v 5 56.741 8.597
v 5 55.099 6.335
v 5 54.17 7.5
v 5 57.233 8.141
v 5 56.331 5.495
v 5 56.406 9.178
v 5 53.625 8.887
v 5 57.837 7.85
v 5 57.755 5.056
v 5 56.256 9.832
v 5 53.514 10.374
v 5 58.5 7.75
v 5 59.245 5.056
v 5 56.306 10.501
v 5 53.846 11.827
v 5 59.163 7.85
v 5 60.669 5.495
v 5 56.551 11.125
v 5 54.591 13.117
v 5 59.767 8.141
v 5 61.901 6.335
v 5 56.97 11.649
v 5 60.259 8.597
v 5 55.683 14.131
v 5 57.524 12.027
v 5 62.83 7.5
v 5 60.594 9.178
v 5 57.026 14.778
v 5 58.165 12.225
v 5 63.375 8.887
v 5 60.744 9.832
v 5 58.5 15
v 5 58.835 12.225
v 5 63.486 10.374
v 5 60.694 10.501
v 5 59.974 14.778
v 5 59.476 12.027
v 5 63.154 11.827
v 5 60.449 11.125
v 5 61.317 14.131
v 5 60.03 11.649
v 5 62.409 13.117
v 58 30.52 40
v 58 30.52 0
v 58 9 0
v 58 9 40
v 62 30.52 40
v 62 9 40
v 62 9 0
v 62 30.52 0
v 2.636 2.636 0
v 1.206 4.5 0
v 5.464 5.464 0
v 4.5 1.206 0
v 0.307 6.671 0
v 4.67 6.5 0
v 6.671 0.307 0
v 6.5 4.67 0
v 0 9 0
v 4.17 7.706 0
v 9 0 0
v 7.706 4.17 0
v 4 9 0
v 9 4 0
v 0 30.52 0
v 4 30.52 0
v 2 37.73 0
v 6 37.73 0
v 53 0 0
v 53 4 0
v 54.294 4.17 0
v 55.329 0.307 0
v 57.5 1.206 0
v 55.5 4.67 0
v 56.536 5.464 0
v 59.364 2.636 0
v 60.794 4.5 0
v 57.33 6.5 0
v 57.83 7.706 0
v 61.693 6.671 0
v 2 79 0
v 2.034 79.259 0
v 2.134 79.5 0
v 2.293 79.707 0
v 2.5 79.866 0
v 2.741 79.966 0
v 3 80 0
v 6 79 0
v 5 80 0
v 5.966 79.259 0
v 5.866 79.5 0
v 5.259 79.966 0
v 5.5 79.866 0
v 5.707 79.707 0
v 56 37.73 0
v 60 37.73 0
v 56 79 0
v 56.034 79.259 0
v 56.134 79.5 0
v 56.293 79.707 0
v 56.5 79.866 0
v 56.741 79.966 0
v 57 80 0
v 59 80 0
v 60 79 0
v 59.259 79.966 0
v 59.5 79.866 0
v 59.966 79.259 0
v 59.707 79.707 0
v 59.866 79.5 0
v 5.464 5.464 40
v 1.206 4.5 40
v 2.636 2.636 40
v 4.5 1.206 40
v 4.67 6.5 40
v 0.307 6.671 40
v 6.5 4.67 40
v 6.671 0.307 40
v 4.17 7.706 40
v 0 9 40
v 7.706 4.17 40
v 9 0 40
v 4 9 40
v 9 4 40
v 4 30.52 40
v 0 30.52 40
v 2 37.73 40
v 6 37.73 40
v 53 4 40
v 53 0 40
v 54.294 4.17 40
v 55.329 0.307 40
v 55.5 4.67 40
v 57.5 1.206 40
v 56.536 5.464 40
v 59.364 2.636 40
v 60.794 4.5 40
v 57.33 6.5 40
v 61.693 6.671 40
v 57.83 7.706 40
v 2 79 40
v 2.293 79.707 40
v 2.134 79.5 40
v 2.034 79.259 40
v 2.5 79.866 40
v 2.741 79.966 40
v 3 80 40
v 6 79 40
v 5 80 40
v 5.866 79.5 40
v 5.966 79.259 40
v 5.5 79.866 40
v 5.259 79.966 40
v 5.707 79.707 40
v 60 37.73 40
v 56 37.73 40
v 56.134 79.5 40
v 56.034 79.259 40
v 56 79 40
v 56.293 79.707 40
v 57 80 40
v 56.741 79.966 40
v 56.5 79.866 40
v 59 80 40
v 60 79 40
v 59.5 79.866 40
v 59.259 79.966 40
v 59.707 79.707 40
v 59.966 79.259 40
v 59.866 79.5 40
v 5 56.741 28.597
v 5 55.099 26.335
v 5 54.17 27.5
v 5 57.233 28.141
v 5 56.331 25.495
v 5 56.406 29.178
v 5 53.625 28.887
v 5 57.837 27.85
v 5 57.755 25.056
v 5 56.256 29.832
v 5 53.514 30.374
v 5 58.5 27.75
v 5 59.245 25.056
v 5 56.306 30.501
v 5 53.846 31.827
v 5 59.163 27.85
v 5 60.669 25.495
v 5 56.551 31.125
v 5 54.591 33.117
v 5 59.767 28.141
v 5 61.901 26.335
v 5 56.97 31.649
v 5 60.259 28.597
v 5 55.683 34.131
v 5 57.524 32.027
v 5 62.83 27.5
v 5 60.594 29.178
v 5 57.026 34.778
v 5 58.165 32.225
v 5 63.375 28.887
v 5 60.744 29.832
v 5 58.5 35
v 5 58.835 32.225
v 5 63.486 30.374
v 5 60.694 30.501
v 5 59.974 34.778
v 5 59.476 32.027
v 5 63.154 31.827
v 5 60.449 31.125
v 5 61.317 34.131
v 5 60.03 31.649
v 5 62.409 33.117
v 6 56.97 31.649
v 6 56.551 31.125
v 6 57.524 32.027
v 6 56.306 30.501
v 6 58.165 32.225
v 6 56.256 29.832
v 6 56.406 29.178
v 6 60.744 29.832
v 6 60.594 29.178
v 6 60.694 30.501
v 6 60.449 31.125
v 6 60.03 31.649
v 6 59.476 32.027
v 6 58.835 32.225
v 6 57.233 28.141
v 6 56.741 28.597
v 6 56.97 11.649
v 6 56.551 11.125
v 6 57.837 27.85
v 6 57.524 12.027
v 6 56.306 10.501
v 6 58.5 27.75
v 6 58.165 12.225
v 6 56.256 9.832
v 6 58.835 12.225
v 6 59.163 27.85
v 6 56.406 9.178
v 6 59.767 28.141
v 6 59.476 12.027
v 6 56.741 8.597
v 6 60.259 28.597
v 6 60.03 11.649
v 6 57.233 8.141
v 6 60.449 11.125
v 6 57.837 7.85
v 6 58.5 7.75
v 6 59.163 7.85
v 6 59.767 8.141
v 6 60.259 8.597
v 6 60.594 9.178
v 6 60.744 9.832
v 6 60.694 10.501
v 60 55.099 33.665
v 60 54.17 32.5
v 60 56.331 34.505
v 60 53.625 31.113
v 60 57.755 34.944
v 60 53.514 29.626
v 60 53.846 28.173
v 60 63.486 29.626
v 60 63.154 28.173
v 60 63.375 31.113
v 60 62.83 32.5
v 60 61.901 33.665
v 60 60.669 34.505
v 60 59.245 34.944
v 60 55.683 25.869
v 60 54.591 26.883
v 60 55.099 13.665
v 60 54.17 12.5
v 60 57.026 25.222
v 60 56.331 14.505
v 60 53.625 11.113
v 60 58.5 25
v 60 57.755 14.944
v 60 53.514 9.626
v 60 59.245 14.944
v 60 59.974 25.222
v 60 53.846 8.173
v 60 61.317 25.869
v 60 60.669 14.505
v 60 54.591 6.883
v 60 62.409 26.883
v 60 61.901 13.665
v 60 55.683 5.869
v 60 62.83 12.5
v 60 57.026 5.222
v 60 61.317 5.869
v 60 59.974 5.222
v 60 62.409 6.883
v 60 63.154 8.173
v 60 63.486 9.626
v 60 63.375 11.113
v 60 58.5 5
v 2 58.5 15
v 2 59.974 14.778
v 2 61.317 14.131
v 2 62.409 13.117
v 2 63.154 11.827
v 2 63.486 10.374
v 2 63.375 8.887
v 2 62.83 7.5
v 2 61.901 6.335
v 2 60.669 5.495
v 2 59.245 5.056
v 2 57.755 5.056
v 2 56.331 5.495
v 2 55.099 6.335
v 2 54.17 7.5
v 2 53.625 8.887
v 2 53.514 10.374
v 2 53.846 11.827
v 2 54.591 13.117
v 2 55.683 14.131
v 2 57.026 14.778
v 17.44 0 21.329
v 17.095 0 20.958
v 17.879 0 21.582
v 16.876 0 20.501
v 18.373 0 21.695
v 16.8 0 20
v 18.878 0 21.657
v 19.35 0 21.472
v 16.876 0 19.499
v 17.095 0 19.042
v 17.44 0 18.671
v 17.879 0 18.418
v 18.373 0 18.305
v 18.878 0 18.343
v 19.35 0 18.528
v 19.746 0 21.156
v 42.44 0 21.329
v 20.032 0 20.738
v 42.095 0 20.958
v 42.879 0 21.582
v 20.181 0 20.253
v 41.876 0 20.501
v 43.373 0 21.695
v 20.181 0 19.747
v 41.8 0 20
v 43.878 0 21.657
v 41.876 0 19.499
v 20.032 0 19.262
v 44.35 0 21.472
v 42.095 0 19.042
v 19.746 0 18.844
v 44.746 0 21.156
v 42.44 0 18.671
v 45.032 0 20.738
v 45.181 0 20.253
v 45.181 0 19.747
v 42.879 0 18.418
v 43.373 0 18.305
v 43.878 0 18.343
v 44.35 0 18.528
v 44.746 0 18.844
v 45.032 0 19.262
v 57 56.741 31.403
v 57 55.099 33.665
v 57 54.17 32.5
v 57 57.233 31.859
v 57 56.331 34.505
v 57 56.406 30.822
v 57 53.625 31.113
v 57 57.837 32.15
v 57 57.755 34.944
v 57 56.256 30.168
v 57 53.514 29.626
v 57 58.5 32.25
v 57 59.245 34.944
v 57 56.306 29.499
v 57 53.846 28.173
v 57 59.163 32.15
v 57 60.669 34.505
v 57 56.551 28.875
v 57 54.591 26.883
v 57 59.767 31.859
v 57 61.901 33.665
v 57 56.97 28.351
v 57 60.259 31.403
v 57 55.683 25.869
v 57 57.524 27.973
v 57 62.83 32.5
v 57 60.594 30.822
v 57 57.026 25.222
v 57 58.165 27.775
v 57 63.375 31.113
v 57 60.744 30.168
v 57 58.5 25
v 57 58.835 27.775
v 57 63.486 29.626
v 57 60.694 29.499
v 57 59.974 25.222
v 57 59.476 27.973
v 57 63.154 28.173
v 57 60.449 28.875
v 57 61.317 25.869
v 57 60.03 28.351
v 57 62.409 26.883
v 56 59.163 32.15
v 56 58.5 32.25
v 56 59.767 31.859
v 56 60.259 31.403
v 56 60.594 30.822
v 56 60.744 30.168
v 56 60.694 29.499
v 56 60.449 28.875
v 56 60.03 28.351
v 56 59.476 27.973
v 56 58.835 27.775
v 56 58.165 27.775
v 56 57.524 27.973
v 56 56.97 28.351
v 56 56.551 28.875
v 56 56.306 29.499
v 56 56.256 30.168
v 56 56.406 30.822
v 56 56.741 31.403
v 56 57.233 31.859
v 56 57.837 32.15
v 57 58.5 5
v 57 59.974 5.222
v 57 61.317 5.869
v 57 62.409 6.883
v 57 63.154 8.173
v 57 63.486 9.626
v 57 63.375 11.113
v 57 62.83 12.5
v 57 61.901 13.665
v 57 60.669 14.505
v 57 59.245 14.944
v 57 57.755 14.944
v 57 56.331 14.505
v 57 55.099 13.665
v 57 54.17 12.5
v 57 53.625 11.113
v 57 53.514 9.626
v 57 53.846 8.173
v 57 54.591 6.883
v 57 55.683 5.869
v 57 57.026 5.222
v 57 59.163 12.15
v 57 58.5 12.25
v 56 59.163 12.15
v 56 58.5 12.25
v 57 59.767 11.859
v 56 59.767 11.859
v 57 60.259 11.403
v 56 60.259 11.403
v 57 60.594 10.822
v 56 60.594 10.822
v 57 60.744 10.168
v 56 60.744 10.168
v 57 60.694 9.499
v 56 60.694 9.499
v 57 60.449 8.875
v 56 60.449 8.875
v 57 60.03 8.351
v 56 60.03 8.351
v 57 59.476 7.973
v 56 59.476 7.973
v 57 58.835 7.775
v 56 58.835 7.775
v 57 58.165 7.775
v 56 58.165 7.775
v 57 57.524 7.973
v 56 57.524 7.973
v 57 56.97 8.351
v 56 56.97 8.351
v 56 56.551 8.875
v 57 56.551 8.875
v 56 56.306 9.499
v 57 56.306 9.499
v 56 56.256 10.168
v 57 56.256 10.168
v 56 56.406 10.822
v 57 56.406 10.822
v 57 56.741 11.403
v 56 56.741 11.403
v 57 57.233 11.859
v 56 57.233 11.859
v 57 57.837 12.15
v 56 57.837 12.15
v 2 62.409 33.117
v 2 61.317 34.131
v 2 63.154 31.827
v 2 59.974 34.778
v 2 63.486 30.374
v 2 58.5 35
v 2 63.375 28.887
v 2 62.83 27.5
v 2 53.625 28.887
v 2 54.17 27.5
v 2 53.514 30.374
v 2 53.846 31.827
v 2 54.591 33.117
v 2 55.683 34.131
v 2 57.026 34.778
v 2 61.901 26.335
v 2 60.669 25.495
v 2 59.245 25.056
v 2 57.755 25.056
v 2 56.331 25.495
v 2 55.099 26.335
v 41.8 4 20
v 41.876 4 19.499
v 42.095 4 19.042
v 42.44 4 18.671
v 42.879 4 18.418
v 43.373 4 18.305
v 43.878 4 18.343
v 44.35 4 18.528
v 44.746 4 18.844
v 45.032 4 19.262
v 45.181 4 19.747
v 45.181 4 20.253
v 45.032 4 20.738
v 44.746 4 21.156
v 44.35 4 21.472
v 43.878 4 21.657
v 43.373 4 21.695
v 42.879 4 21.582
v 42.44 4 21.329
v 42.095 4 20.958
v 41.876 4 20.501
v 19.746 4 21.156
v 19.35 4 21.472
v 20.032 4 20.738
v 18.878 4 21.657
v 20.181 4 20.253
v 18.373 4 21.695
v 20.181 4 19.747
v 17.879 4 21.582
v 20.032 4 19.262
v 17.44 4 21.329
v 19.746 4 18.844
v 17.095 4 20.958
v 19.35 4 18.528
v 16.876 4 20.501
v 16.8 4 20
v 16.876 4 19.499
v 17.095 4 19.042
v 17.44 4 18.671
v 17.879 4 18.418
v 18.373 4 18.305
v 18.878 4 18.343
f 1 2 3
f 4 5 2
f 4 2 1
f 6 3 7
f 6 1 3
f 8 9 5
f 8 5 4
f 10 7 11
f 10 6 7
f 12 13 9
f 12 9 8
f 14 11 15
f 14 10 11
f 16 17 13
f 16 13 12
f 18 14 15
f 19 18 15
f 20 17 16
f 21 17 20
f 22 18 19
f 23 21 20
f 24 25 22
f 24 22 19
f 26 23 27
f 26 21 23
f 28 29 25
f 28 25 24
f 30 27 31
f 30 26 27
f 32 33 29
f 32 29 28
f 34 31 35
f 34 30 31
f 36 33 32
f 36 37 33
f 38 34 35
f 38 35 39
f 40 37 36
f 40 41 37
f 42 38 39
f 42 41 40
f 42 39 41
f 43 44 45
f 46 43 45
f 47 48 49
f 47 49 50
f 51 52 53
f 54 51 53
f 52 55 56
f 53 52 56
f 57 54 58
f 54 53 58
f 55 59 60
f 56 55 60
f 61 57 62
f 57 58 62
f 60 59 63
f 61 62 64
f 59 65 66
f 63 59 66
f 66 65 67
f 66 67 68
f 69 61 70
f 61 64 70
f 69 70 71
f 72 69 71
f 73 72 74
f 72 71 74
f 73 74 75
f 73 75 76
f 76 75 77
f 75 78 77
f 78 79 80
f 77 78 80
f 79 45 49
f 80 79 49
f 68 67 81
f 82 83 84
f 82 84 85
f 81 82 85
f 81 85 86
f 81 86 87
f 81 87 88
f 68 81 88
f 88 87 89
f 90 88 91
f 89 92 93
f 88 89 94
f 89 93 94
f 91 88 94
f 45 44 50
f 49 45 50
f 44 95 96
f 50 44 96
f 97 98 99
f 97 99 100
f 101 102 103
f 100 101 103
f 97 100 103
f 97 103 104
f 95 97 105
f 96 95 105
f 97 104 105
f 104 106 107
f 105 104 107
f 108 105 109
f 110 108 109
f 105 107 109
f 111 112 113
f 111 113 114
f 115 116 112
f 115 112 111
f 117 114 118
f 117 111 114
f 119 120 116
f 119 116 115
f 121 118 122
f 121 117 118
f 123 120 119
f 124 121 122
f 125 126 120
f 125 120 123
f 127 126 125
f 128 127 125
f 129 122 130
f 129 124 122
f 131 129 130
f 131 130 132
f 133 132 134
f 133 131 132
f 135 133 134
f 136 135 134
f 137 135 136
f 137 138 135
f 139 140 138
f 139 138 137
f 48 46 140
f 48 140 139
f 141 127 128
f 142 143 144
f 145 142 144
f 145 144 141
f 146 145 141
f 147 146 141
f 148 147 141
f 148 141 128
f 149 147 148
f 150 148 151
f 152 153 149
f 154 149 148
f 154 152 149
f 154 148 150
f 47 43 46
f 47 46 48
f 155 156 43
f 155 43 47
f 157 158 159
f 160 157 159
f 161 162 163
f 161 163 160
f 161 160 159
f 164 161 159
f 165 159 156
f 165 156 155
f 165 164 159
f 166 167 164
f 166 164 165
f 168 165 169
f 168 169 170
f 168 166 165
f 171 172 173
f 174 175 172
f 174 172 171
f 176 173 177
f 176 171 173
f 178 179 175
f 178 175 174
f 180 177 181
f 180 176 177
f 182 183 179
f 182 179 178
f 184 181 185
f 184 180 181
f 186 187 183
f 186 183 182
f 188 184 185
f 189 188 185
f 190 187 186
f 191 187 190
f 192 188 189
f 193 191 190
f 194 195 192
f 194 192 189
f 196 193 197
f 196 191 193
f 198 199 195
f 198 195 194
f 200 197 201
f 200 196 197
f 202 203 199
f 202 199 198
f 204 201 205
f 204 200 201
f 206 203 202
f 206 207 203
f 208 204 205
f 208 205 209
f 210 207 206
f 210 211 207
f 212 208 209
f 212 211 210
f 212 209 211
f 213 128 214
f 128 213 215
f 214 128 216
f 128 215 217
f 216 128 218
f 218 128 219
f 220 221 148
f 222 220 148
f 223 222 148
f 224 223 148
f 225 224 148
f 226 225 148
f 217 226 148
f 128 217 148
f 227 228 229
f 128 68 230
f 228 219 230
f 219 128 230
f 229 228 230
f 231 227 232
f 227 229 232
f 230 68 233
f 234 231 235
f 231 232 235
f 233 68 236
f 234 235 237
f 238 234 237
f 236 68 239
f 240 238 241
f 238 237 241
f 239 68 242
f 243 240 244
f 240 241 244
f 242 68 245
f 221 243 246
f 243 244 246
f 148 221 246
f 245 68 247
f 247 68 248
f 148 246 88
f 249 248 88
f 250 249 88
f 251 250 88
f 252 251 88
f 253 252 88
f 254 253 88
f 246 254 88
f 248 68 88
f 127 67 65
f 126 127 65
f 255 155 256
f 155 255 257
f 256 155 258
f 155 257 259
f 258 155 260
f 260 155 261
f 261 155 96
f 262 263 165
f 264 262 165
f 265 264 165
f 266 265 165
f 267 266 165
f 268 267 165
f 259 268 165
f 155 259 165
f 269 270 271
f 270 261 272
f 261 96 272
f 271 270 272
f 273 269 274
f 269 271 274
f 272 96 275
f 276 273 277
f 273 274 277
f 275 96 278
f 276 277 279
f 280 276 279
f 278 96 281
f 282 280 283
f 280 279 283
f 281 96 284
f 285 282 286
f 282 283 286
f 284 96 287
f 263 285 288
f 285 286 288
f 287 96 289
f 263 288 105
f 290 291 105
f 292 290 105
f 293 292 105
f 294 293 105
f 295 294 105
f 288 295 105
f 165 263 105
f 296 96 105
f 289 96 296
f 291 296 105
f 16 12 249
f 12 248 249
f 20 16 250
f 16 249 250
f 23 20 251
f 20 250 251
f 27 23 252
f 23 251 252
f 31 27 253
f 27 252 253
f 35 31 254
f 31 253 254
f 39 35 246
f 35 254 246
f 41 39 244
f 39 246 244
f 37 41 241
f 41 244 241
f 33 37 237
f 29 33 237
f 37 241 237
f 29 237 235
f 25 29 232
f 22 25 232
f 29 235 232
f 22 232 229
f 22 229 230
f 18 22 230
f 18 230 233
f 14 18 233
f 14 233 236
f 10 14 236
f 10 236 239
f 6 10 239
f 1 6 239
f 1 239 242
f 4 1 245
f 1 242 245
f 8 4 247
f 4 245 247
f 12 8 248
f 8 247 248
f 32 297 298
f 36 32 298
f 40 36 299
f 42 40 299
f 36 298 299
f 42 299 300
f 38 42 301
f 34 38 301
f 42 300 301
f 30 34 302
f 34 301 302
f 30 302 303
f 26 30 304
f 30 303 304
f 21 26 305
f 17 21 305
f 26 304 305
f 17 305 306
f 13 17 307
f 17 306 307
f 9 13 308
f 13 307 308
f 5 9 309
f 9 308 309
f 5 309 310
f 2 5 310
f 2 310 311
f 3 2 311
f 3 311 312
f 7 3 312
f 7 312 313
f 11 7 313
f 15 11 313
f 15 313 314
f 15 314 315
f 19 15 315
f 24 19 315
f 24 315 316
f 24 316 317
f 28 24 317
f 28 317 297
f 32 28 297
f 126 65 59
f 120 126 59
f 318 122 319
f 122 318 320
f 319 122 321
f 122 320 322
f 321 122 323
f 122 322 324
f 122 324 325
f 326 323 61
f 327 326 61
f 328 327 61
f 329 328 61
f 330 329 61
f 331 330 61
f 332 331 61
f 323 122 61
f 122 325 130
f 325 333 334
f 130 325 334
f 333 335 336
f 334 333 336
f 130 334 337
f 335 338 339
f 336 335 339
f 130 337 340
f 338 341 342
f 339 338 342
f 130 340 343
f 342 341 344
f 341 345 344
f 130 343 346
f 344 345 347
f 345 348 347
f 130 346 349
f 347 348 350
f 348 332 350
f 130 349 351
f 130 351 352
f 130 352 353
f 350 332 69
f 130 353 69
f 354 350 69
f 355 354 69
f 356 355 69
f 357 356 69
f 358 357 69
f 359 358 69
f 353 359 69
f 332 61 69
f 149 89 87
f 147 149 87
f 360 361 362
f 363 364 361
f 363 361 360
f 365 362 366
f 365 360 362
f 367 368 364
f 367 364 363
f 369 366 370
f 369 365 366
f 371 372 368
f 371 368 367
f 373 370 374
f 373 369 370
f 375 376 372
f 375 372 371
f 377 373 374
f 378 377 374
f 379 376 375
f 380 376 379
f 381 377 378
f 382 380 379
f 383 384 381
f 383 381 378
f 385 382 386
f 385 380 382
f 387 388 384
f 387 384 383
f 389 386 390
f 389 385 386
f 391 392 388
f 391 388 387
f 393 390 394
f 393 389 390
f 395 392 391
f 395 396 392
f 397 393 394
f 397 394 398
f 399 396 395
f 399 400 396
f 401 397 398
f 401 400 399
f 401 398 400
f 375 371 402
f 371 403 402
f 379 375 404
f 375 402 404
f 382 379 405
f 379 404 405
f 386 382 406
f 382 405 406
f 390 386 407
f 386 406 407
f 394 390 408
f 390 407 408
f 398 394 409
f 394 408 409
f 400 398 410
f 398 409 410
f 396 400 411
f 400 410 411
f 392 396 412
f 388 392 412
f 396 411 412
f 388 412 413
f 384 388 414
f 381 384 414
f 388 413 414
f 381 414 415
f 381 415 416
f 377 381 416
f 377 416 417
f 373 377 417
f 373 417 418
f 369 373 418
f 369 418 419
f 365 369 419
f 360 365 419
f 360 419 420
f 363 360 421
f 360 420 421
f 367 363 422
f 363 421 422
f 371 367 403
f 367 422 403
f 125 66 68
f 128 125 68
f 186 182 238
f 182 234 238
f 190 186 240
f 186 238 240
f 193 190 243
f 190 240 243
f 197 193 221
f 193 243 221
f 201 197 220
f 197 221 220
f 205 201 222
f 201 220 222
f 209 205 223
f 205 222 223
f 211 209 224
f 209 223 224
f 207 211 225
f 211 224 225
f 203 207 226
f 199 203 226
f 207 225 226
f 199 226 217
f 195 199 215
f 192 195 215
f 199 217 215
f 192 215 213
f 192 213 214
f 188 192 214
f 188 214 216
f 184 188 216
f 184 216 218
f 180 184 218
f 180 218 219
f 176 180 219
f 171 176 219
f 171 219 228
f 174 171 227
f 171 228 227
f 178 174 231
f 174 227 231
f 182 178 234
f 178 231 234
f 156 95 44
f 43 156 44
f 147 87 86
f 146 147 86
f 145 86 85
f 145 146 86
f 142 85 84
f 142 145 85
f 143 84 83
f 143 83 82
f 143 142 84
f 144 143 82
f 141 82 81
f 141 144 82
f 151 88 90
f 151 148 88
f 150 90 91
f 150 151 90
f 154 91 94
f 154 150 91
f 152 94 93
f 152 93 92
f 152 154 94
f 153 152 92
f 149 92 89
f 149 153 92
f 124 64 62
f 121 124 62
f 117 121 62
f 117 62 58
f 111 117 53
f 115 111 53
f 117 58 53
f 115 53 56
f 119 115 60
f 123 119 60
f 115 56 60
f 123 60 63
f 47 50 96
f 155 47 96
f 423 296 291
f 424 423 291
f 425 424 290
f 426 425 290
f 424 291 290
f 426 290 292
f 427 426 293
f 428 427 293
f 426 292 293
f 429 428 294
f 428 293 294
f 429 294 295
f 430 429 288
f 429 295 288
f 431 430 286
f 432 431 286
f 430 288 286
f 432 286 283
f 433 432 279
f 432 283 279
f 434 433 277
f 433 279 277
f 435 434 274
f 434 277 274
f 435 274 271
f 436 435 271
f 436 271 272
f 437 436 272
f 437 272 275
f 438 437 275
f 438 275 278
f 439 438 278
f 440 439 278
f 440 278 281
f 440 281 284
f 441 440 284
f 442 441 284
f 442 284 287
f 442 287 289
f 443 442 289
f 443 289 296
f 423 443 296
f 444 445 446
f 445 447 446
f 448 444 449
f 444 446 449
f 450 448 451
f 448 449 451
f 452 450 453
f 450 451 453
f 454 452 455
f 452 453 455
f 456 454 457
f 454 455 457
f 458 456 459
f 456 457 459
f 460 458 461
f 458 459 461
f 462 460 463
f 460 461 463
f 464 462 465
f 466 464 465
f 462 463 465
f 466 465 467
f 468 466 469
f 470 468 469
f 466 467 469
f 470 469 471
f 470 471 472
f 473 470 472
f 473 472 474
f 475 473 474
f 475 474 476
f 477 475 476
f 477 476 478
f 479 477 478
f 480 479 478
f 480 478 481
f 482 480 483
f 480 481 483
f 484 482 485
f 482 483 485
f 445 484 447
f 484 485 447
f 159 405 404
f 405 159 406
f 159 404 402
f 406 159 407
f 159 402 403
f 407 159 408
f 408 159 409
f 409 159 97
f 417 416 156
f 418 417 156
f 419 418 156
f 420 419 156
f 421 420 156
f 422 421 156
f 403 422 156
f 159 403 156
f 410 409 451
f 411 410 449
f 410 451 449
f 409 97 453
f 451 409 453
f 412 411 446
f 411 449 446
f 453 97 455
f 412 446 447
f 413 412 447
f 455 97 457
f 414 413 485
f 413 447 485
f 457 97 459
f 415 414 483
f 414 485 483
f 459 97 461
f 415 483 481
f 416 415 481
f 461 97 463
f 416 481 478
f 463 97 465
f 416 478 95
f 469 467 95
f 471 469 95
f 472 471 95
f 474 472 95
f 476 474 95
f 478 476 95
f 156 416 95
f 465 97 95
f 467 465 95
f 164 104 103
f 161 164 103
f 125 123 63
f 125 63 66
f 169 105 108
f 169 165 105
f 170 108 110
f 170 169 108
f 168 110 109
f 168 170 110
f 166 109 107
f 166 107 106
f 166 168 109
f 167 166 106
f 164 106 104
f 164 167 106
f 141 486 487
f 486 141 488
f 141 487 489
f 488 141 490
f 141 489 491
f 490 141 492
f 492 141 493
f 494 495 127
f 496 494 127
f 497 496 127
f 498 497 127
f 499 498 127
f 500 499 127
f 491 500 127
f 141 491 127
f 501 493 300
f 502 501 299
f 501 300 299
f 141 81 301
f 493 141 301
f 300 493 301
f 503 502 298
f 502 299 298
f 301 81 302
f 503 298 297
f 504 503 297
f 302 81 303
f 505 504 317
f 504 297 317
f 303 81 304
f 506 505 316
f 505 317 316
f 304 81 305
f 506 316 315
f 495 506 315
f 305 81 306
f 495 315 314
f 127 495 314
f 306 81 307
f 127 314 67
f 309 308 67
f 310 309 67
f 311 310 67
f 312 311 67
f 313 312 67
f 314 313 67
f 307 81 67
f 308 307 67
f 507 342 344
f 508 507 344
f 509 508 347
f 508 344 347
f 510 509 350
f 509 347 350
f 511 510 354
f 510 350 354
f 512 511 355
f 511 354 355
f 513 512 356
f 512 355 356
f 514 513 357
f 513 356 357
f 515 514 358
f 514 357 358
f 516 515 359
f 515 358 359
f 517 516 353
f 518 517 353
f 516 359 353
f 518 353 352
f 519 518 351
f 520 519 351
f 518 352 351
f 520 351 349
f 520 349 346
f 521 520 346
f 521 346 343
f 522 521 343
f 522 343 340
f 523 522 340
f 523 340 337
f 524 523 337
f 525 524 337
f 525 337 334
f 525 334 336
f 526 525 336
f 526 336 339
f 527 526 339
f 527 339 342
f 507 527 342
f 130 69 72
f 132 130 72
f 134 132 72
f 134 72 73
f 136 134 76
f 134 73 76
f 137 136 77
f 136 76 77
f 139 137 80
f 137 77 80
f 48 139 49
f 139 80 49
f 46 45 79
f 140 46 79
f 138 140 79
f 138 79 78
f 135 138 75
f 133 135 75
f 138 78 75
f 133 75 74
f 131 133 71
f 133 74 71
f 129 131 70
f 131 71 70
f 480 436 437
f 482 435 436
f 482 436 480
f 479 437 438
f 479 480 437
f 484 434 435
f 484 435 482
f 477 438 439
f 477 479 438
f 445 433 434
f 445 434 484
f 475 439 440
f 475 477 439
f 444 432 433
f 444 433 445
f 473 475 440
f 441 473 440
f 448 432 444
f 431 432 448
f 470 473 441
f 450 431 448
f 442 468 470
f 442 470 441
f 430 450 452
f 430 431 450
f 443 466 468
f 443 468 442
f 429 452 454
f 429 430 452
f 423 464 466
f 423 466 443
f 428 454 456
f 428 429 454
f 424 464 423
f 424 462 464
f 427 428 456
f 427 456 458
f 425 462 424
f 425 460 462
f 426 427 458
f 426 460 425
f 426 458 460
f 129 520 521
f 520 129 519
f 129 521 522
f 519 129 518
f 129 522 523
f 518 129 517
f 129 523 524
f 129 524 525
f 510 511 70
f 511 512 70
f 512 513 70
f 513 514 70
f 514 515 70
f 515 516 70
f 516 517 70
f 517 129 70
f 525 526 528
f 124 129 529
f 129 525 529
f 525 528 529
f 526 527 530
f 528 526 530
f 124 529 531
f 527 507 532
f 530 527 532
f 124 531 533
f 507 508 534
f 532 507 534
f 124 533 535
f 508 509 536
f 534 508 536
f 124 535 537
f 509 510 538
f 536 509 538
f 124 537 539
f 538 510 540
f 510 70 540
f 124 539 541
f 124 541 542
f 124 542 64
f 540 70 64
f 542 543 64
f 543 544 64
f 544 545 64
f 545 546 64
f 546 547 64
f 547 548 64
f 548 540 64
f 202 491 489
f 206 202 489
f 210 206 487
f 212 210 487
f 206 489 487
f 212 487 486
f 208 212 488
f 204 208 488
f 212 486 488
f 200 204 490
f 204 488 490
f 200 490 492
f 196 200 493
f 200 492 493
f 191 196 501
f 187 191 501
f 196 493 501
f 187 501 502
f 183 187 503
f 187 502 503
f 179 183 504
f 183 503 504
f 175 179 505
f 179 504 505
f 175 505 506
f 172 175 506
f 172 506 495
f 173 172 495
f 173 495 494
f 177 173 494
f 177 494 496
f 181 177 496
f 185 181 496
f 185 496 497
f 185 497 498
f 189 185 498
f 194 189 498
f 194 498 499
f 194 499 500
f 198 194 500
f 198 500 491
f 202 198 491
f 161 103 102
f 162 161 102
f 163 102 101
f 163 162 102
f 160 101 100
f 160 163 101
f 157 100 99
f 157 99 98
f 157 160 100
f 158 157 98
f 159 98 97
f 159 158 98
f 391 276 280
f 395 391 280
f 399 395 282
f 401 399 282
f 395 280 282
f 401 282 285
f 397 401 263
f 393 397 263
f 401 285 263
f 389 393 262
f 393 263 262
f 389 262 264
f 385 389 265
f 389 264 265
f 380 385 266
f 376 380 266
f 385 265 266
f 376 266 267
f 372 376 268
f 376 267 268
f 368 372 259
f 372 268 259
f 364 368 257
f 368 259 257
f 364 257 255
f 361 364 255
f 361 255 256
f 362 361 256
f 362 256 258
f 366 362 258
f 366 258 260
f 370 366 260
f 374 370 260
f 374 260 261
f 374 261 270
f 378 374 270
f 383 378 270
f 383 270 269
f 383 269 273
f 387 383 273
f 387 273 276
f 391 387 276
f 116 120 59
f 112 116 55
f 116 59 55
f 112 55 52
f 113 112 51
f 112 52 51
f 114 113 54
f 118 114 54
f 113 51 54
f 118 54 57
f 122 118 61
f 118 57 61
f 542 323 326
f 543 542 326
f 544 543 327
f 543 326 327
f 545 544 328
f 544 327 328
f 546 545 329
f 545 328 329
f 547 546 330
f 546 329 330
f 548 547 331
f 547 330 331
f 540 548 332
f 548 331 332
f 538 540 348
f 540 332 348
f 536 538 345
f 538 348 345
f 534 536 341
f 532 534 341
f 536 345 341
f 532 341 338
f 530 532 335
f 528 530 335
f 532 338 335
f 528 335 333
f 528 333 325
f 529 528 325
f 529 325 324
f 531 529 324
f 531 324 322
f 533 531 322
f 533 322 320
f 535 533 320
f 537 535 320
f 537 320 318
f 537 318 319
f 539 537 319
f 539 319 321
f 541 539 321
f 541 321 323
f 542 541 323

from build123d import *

# Parameters (mm, degrees)
ESTRUSIONE_ESTRUSIONE1_DEPTH                         = 40
RACCORDO1_R                                          = 1
FORO_LAMATO_PER_BULLONE_M12_A_TESTA_ESAG_D           = 4.5
FORO_LAMATO_PER_BULLONE_M12_A_TESTA_ESAG_DEPTH       = 8.5
FORO_LAMATO_PER_BULLONE_M12_A_TESTA_ESAG_CBORE_D     = 10
FORO_LAMATO_PER_BULLONE_M12_A_TESTA_ESAG_CBORE_DEPTH = 3
FORO_LAMATO_PER_BULLONE_M12_A_TESTA_ESAG_TIP         = 1.351936393
FORO_LAMATO_PER_BULLONE_M12_A_TESTA_2_D              = 4.5
FORO_LAMATO_PER_BULLONE_M12_A_TESTA_2_DEPTH          = 8.5
FORO_LAMATO_PER_BULLONE_M12_A_TESTA_2_CBORE_D        = 10
FORO_LAMATO_PER_BULLONE_M12_A_TESTA_2_CBORE_DEPTH    = 3
FORO_LAMATO_PER_BULLONE_M12_A_TESTA_2_TIP            = 1.351936393
FORO_PER_VITE_M3_1_D                                 = 3.4
FORO_PER_VITE_M3_1_DEPTH                             = 8.5
FORO_PER_VITE_M3_1_TIP                               = 1.021463052


with BuildPart() as part:
    # Schizzo1 → Estrusione-Estrusione1 (new body)
    with BuildSketch(Plane.XY):
        with BuildLine():
            Line((9, 0), (53, 0))
            ThreePointArc((53, 0), (59.363961031, 2.636038969), (62, 9))
            Line((62, 9), (62, 30.52))
            Line((62, 30.52), (60, 37.73))
            Line((60, 37.73), (60, 80))
            Line((60, 80), (56, 80))
            Line((56, 80), (56, 37.73))
            Line((56, 37.73), (58, 30.52))
            Line((58, 30.52), (58, 9))
            ThreePointArc((58, 9), (56.535533906, 5.464466094), (53, 4))
            Line((53, 4), (9, 4))
            ThreePointArc((9, 4), (5.464466094, 5.464466094), (4, 9))
            Line((4, 9), (4, 30.52))
            Line((4, 30.52), (6, 37.73))
            Line((6, 37.73), (6, 80))
            Line((6, 80), (2, 80))
            Line((2, 80), (2, 37.73))
            Line((2, 37.73), (0, 30.52))
            Line((0, 30.52), (0, 9))
            ThreePointArc((0, 9), (2.636038969, 2.636038969), (9, 0))
        make_face()
    extrude(amount=ESTRUSIONE_ESTRUSIONE1_DEPTH)

    # Raccordo1
    raccordo1_edges = [part.edges().sort_by_distance(p)[0] for p in [
        (2, 80, 20),
        (6, 80, 20),
        (56, 80, 20),
        (60, 80, 20),
    ]]
    fillet(raccordo1_edges, radius=RACCORDO1_R)

    # Foro lamato per Bullone M12 a testa esag
    with Locations(Plane.ZY.offset(-2)):
        with Locations((10, 58.5), (30, 58.5)):
            CounterBoreHole(FORO_LAMATO_PER_BULLONE_M12_A_TESTA_ESAG_D / 2, FORO_LAMATO_PER_BULLONE_M12_A_TESTA_ESAG_CBORE_D / 2, FORO_LAMATO_PER_BULLONE_M12_A_TESTA_ESAG_CBORE_DEPTH, depth=FORO_LAMATO_PER_BULLONE_M12_A_TESTA_ESAG_DEPTH)
            with Locations((0, 0, -(FORO_LAMATO_PER_BULLONE_M12_A_TESTA_ESAG_DEPTH + FORO_LAMATO_PER_BULLONE_M12_A_TESTA_ESAG_TIP / 2))):  # 118° drill point
                Cone(0, FORO_LAMATO_PER_BULLONE_M12_A_TESTA_ESAG_D / 2, FORO_LAMATO_PER_BULLONE_M12_A_TESTA_ESAG_TIP, mode=Mode.SUBTRACT)

    # Foro lamato per Bullone M12 a testa  2
    with Locations(Plane(origin=(60, 0, 0), x_dir=(0, 0, -1), z_dir=(1, 0, 0))):
        with Locations((-30, 58.5), (-10, 58.5)):
            CounterBoreHole(FORO_LAMATO_PER_BULLONE_M12_A_TESTA_2_D / 2, FORO_LAMATO_PER_BULLONE_M12_A_TESTA_2_CBORE_D / 2, FORO_LAMATO_PER_BULLONE_M12_A_TESTA_2_CBORE_DEPTH, depth=FORO_LAMATO_PER_BULLONE_M12_A_TESTA_2_DEPTH)
            with Locations((0, 0, -(FORO_LAMATO_PER_BULLONE_M12_A_TESTA_2_DEPTH + FORO_LAMATO_PER_BULLONE_M12_A_TESTA_2_TIP / 2))):  # 118° drill point
                Cone(0, FORO_LAMATO_PER_BULLONE_M12_A_TESTA_2_D / 2, FORO_LAMATO_PER_BULLONE_M12_A_TESTA_2_TIP, mode=Mode.SUBTRACT)

    # Foro per Vite M3-1
    with Locations(Plane(origin=(0, 4, 0), x_dir=(1, 0, 0), z_dir=(0, 1, 0))):
        with Locations((18.5, -20), (43.5, -20)):
            Hole(FORO_PER_VITE_M3_1_D / 2, depth=FORO_PER_VITE_M3_1_DEPTH)
            with Locations((0, 0, -(FORO_PER_VITE_M3_1_DEPTH + FORO_PER_VITE_M3_1_TIP / 2))):  # 118° drill point
                Cone(0, FORO_PER_VITE_M3_1_D / 2, FORO_PER_VITE_M3_1_TIP, mode=Mode.SUBTRACT)


solid = part.part
